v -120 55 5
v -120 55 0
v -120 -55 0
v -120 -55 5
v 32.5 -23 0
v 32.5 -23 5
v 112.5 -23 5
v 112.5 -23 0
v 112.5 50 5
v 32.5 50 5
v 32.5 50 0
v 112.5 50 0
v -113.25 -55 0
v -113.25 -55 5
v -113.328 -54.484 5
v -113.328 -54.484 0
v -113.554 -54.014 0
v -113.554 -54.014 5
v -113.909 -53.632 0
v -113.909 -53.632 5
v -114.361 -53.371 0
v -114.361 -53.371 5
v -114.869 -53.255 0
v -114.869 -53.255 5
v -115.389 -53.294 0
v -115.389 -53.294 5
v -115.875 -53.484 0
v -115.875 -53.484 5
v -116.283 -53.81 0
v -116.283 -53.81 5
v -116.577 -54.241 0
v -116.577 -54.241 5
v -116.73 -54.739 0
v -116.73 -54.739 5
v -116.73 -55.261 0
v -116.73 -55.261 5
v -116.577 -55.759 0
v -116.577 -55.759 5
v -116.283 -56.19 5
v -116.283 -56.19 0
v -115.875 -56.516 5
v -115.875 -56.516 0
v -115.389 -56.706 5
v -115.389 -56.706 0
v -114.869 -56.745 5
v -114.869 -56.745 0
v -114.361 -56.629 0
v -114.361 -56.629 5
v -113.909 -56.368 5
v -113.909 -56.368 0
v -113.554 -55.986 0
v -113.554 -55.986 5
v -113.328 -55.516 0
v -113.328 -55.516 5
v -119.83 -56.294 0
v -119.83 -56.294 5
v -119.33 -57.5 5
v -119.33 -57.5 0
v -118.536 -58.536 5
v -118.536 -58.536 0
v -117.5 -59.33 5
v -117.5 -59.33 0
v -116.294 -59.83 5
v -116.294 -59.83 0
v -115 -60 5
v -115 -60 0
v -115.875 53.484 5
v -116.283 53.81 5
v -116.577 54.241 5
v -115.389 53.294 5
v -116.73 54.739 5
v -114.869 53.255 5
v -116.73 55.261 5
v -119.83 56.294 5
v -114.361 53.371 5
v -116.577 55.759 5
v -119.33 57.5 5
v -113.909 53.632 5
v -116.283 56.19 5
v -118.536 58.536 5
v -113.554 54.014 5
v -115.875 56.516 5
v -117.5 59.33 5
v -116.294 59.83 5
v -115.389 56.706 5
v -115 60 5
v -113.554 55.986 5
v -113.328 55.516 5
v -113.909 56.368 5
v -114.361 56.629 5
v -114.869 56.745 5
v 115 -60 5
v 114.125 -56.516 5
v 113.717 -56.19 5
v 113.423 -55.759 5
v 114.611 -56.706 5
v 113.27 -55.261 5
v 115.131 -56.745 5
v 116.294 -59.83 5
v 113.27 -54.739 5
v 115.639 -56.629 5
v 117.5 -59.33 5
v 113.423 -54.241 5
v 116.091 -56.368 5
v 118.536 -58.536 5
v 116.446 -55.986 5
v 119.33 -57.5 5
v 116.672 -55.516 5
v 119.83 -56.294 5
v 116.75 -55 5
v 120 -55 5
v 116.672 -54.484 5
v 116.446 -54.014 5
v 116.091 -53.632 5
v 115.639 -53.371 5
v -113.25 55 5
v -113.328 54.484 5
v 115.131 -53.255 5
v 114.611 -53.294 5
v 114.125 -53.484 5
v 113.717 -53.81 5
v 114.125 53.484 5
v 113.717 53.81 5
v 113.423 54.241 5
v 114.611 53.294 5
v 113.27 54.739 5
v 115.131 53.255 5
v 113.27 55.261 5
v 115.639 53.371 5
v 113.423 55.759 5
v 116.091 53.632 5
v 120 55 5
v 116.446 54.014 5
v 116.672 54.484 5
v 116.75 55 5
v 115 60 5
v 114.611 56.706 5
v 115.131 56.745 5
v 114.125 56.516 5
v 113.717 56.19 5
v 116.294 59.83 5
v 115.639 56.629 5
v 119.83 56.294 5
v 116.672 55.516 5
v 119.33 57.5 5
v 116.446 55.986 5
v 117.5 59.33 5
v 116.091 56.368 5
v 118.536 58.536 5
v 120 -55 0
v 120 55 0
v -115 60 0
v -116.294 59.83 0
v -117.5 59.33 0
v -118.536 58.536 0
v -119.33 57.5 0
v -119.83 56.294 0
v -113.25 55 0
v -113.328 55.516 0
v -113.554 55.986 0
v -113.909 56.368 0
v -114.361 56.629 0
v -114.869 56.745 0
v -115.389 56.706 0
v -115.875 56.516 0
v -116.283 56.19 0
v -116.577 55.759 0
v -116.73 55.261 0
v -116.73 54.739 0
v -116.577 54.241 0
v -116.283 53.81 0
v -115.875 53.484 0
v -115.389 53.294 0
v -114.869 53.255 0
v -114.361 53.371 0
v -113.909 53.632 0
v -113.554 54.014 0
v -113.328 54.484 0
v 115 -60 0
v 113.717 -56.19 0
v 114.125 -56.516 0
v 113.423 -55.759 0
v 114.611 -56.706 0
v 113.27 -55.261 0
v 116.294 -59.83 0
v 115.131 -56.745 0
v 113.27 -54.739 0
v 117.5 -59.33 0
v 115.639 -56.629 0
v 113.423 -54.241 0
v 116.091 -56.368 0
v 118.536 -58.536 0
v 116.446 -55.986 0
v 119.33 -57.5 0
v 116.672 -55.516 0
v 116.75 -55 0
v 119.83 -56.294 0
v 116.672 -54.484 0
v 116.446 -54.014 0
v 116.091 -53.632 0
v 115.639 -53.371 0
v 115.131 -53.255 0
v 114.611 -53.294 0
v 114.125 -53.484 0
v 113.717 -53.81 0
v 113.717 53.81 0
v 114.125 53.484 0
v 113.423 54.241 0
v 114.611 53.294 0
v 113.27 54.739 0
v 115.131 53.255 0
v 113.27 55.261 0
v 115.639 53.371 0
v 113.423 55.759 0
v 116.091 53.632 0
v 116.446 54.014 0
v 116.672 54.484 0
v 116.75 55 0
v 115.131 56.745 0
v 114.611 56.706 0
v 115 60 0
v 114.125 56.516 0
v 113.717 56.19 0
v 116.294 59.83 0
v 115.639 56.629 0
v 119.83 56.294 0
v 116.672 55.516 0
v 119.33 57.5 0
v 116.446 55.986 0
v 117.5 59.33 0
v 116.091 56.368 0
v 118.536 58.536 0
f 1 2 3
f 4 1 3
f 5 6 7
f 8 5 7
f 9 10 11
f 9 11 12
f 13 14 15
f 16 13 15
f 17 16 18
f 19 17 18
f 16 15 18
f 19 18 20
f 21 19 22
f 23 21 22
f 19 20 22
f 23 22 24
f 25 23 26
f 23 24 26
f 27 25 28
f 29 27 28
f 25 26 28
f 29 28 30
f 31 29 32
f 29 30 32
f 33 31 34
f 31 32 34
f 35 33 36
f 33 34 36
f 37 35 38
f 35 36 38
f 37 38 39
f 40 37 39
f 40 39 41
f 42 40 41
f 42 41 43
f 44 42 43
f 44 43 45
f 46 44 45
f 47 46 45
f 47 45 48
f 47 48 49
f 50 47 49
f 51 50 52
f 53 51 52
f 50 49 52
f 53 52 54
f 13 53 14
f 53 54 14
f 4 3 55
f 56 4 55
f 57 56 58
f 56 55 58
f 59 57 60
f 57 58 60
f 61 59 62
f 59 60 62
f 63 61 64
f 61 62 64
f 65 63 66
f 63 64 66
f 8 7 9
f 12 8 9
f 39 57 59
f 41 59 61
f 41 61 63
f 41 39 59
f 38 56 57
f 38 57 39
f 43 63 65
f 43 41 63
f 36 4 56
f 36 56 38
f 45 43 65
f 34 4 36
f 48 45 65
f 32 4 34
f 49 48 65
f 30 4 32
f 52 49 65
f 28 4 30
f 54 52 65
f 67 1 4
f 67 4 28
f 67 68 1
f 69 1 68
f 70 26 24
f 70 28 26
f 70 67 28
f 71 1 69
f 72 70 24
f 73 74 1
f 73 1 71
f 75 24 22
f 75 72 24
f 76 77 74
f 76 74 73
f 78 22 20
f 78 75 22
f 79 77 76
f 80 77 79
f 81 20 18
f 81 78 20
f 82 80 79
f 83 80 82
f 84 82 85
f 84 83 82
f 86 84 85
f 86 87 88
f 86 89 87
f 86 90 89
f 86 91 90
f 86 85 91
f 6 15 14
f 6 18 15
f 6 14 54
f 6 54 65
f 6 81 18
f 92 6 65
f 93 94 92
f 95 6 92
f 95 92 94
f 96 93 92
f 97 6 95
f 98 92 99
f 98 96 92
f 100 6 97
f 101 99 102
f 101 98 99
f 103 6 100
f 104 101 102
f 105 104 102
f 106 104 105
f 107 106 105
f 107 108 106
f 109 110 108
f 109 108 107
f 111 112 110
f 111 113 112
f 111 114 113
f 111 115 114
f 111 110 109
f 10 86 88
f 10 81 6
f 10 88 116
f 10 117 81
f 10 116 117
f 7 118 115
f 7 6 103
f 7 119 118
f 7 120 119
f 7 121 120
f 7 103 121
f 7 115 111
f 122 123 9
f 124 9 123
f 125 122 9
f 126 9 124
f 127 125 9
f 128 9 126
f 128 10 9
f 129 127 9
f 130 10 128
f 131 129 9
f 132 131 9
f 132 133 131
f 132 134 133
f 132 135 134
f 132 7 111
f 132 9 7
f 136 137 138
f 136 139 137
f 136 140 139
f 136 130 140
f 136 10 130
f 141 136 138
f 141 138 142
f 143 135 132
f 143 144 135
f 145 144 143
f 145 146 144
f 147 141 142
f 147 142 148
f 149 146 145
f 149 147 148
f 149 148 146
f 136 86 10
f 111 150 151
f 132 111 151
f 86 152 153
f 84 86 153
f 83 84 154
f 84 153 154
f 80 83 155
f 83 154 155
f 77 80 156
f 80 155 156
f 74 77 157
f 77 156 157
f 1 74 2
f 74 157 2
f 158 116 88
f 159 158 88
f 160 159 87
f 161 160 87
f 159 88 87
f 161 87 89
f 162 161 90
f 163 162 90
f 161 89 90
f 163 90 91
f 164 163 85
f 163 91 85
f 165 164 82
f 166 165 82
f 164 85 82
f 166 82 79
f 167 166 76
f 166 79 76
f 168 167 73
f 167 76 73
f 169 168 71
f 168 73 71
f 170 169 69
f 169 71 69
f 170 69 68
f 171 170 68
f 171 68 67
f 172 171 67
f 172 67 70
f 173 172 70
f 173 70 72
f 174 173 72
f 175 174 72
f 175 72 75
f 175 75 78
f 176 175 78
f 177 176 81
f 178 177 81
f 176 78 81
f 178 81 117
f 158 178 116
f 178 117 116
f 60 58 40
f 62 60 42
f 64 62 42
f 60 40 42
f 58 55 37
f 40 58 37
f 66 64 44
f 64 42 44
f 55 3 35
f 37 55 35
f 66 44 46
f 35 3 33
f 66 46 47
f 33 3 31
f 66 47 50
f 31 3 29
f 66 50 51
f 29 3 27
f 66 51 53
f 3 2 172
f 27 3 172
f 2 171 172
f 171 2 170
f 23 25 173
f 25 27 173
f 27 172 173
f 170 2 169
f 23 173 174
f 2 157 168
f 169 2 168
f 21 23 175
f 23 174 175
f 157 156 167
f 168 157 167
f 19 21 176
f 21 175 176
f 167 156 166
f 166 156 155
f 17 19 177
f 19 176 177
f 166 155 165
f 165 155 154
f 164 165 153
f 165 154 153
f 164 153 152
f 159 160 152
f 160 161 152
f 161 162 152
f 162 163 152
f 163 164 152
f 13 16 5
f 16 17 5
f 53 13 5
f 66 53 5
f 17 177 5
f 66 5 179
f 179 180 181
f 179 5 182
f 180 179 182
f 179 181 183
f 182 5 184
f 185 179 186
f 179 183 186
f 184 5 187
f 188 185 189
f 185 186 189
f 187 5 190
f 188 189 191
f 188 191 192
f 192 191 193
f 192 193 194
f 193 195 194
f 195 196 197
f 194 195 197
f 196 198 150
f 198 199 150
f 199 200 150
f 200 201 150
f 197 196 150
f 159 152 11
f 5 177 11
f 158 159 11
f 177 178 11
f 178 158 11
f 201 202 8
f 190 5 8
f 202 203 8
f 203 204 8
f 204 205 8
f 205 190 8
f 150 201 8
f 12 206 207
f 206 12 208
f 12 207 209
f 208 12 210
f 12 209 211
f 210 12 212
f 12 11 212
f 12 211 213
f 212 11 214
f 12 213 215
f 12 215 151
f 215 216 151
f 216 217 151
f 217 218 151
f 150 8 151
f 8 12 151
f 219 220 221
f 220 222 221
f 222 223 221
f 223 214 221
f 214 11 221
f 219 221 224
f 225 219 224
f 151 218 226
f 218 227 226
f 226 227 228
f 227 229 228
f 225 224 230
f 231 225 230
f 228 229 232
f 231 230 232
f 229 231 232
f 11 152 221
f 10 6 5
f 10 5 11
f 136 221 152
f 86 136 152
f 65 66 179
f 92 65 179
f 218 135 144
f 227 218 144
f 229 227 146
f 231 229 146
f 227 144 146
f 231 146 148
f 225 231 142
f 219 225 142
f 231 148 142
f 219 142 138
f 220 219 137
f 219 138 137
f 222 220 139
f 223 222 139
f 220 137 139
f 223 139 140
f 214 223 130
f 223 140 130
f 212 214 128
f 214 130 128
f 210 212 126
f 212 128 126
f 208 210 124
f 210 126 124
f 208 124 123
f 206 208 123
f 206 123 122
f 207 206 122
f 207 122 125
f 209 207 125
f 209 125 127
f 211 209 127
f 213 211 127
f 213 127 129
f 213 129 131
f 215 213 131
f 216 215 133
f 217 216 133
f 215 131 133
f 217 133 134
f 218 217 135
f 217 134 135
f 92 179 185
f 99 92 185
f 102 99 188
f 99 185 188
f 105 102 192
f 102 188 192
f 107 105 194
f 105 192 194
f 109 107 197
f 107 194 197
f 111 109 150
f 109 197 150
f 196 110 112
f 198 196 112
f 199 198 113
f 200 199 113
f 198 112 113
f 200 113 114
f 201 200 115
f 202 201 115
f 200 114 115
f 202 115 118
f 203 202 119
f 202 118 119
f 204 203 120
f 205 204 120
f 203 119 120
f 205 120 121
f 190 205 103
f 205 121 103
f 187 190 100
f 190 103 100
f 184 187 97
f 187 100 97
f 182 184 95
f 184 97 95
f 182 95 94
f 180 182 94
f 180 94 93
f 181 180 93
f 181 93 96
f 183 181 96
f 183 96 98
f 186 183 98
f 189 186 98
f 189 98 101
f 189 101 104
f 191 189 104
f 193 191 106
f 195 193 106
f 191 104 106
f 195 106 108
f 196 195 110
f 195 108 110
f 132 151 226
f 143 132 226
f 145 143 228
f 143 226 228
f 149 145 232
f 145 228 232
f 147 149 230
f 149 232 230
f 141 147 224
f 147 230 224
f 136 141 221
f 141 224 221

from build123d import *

# Parameters (mm, degrees)
BOSS_EXTRUDE1_DEPTH   = 5
SKETCH2_R             = 1.75
LUKNE_M3_VIJAKI_DEPTH = 5
SKETCH3_W             = 80
SKETCH3_H             = 73
CUT_EXTRUDE2_DEPTH    = 5


with BuildPart() as part:
    # Sketch1 → Boss-Extrude1 (new body)
    with BuildSketch(Plane.XY):
        with BuildLine():
            Line((-115, -60), (115, -60))
            ThreePointArc((115, -60), (118.535533906, -58.535533906), (120, -55))
            Line((120, -55), (120, 55))
            ThreePointArc((120, 55), (118.535533906, 58.535533906), (115, 60))
            Line((115, 60), (-115, 60))
            ThreePointArc((-115, 60), (-118.535533906, 58.535533906), (-120, 55))
            Line((-120, 55), (-120, -55))
            ThreePointArc((-120, -55), (-118.535533906, -58.535533906), (-115, -60))
        make_face()
    extrude(amount=BOSS_EXTRUDE1_DEPTH)

    # Sketch2 → lukne_m3_vijaki (cut)
    with BuildSketch(Plane.XY.offset(5)):
        with Locations((-115, 55)):
            Circle(SKETCH2_R)
        with Locations((115, 55)):
            Circle(SKETCH2_R)
        with Locations((115, -55)):
            Circle(SKETCH2_R)
        with Locations((-115, -55)):
            Circle(SKETCH2_R)
    extrude(amount=-LUKNE_M3_VIJAKI_DEPTH, mode=Mode.SUBTRACT)

    # Sketch3 → Cut-Extrude2 (cut)
    with BuildSketch(Plane.XY.offset(5)):
        with Locations((72.5, 13.5)):
            Rectangle(SKETCH3_W, SKETCH3_H)
    extrude(amount=-CUT_EXTRUDE2_DEPTH, mode=Mode.SUBTRACT)


solid = part.part
